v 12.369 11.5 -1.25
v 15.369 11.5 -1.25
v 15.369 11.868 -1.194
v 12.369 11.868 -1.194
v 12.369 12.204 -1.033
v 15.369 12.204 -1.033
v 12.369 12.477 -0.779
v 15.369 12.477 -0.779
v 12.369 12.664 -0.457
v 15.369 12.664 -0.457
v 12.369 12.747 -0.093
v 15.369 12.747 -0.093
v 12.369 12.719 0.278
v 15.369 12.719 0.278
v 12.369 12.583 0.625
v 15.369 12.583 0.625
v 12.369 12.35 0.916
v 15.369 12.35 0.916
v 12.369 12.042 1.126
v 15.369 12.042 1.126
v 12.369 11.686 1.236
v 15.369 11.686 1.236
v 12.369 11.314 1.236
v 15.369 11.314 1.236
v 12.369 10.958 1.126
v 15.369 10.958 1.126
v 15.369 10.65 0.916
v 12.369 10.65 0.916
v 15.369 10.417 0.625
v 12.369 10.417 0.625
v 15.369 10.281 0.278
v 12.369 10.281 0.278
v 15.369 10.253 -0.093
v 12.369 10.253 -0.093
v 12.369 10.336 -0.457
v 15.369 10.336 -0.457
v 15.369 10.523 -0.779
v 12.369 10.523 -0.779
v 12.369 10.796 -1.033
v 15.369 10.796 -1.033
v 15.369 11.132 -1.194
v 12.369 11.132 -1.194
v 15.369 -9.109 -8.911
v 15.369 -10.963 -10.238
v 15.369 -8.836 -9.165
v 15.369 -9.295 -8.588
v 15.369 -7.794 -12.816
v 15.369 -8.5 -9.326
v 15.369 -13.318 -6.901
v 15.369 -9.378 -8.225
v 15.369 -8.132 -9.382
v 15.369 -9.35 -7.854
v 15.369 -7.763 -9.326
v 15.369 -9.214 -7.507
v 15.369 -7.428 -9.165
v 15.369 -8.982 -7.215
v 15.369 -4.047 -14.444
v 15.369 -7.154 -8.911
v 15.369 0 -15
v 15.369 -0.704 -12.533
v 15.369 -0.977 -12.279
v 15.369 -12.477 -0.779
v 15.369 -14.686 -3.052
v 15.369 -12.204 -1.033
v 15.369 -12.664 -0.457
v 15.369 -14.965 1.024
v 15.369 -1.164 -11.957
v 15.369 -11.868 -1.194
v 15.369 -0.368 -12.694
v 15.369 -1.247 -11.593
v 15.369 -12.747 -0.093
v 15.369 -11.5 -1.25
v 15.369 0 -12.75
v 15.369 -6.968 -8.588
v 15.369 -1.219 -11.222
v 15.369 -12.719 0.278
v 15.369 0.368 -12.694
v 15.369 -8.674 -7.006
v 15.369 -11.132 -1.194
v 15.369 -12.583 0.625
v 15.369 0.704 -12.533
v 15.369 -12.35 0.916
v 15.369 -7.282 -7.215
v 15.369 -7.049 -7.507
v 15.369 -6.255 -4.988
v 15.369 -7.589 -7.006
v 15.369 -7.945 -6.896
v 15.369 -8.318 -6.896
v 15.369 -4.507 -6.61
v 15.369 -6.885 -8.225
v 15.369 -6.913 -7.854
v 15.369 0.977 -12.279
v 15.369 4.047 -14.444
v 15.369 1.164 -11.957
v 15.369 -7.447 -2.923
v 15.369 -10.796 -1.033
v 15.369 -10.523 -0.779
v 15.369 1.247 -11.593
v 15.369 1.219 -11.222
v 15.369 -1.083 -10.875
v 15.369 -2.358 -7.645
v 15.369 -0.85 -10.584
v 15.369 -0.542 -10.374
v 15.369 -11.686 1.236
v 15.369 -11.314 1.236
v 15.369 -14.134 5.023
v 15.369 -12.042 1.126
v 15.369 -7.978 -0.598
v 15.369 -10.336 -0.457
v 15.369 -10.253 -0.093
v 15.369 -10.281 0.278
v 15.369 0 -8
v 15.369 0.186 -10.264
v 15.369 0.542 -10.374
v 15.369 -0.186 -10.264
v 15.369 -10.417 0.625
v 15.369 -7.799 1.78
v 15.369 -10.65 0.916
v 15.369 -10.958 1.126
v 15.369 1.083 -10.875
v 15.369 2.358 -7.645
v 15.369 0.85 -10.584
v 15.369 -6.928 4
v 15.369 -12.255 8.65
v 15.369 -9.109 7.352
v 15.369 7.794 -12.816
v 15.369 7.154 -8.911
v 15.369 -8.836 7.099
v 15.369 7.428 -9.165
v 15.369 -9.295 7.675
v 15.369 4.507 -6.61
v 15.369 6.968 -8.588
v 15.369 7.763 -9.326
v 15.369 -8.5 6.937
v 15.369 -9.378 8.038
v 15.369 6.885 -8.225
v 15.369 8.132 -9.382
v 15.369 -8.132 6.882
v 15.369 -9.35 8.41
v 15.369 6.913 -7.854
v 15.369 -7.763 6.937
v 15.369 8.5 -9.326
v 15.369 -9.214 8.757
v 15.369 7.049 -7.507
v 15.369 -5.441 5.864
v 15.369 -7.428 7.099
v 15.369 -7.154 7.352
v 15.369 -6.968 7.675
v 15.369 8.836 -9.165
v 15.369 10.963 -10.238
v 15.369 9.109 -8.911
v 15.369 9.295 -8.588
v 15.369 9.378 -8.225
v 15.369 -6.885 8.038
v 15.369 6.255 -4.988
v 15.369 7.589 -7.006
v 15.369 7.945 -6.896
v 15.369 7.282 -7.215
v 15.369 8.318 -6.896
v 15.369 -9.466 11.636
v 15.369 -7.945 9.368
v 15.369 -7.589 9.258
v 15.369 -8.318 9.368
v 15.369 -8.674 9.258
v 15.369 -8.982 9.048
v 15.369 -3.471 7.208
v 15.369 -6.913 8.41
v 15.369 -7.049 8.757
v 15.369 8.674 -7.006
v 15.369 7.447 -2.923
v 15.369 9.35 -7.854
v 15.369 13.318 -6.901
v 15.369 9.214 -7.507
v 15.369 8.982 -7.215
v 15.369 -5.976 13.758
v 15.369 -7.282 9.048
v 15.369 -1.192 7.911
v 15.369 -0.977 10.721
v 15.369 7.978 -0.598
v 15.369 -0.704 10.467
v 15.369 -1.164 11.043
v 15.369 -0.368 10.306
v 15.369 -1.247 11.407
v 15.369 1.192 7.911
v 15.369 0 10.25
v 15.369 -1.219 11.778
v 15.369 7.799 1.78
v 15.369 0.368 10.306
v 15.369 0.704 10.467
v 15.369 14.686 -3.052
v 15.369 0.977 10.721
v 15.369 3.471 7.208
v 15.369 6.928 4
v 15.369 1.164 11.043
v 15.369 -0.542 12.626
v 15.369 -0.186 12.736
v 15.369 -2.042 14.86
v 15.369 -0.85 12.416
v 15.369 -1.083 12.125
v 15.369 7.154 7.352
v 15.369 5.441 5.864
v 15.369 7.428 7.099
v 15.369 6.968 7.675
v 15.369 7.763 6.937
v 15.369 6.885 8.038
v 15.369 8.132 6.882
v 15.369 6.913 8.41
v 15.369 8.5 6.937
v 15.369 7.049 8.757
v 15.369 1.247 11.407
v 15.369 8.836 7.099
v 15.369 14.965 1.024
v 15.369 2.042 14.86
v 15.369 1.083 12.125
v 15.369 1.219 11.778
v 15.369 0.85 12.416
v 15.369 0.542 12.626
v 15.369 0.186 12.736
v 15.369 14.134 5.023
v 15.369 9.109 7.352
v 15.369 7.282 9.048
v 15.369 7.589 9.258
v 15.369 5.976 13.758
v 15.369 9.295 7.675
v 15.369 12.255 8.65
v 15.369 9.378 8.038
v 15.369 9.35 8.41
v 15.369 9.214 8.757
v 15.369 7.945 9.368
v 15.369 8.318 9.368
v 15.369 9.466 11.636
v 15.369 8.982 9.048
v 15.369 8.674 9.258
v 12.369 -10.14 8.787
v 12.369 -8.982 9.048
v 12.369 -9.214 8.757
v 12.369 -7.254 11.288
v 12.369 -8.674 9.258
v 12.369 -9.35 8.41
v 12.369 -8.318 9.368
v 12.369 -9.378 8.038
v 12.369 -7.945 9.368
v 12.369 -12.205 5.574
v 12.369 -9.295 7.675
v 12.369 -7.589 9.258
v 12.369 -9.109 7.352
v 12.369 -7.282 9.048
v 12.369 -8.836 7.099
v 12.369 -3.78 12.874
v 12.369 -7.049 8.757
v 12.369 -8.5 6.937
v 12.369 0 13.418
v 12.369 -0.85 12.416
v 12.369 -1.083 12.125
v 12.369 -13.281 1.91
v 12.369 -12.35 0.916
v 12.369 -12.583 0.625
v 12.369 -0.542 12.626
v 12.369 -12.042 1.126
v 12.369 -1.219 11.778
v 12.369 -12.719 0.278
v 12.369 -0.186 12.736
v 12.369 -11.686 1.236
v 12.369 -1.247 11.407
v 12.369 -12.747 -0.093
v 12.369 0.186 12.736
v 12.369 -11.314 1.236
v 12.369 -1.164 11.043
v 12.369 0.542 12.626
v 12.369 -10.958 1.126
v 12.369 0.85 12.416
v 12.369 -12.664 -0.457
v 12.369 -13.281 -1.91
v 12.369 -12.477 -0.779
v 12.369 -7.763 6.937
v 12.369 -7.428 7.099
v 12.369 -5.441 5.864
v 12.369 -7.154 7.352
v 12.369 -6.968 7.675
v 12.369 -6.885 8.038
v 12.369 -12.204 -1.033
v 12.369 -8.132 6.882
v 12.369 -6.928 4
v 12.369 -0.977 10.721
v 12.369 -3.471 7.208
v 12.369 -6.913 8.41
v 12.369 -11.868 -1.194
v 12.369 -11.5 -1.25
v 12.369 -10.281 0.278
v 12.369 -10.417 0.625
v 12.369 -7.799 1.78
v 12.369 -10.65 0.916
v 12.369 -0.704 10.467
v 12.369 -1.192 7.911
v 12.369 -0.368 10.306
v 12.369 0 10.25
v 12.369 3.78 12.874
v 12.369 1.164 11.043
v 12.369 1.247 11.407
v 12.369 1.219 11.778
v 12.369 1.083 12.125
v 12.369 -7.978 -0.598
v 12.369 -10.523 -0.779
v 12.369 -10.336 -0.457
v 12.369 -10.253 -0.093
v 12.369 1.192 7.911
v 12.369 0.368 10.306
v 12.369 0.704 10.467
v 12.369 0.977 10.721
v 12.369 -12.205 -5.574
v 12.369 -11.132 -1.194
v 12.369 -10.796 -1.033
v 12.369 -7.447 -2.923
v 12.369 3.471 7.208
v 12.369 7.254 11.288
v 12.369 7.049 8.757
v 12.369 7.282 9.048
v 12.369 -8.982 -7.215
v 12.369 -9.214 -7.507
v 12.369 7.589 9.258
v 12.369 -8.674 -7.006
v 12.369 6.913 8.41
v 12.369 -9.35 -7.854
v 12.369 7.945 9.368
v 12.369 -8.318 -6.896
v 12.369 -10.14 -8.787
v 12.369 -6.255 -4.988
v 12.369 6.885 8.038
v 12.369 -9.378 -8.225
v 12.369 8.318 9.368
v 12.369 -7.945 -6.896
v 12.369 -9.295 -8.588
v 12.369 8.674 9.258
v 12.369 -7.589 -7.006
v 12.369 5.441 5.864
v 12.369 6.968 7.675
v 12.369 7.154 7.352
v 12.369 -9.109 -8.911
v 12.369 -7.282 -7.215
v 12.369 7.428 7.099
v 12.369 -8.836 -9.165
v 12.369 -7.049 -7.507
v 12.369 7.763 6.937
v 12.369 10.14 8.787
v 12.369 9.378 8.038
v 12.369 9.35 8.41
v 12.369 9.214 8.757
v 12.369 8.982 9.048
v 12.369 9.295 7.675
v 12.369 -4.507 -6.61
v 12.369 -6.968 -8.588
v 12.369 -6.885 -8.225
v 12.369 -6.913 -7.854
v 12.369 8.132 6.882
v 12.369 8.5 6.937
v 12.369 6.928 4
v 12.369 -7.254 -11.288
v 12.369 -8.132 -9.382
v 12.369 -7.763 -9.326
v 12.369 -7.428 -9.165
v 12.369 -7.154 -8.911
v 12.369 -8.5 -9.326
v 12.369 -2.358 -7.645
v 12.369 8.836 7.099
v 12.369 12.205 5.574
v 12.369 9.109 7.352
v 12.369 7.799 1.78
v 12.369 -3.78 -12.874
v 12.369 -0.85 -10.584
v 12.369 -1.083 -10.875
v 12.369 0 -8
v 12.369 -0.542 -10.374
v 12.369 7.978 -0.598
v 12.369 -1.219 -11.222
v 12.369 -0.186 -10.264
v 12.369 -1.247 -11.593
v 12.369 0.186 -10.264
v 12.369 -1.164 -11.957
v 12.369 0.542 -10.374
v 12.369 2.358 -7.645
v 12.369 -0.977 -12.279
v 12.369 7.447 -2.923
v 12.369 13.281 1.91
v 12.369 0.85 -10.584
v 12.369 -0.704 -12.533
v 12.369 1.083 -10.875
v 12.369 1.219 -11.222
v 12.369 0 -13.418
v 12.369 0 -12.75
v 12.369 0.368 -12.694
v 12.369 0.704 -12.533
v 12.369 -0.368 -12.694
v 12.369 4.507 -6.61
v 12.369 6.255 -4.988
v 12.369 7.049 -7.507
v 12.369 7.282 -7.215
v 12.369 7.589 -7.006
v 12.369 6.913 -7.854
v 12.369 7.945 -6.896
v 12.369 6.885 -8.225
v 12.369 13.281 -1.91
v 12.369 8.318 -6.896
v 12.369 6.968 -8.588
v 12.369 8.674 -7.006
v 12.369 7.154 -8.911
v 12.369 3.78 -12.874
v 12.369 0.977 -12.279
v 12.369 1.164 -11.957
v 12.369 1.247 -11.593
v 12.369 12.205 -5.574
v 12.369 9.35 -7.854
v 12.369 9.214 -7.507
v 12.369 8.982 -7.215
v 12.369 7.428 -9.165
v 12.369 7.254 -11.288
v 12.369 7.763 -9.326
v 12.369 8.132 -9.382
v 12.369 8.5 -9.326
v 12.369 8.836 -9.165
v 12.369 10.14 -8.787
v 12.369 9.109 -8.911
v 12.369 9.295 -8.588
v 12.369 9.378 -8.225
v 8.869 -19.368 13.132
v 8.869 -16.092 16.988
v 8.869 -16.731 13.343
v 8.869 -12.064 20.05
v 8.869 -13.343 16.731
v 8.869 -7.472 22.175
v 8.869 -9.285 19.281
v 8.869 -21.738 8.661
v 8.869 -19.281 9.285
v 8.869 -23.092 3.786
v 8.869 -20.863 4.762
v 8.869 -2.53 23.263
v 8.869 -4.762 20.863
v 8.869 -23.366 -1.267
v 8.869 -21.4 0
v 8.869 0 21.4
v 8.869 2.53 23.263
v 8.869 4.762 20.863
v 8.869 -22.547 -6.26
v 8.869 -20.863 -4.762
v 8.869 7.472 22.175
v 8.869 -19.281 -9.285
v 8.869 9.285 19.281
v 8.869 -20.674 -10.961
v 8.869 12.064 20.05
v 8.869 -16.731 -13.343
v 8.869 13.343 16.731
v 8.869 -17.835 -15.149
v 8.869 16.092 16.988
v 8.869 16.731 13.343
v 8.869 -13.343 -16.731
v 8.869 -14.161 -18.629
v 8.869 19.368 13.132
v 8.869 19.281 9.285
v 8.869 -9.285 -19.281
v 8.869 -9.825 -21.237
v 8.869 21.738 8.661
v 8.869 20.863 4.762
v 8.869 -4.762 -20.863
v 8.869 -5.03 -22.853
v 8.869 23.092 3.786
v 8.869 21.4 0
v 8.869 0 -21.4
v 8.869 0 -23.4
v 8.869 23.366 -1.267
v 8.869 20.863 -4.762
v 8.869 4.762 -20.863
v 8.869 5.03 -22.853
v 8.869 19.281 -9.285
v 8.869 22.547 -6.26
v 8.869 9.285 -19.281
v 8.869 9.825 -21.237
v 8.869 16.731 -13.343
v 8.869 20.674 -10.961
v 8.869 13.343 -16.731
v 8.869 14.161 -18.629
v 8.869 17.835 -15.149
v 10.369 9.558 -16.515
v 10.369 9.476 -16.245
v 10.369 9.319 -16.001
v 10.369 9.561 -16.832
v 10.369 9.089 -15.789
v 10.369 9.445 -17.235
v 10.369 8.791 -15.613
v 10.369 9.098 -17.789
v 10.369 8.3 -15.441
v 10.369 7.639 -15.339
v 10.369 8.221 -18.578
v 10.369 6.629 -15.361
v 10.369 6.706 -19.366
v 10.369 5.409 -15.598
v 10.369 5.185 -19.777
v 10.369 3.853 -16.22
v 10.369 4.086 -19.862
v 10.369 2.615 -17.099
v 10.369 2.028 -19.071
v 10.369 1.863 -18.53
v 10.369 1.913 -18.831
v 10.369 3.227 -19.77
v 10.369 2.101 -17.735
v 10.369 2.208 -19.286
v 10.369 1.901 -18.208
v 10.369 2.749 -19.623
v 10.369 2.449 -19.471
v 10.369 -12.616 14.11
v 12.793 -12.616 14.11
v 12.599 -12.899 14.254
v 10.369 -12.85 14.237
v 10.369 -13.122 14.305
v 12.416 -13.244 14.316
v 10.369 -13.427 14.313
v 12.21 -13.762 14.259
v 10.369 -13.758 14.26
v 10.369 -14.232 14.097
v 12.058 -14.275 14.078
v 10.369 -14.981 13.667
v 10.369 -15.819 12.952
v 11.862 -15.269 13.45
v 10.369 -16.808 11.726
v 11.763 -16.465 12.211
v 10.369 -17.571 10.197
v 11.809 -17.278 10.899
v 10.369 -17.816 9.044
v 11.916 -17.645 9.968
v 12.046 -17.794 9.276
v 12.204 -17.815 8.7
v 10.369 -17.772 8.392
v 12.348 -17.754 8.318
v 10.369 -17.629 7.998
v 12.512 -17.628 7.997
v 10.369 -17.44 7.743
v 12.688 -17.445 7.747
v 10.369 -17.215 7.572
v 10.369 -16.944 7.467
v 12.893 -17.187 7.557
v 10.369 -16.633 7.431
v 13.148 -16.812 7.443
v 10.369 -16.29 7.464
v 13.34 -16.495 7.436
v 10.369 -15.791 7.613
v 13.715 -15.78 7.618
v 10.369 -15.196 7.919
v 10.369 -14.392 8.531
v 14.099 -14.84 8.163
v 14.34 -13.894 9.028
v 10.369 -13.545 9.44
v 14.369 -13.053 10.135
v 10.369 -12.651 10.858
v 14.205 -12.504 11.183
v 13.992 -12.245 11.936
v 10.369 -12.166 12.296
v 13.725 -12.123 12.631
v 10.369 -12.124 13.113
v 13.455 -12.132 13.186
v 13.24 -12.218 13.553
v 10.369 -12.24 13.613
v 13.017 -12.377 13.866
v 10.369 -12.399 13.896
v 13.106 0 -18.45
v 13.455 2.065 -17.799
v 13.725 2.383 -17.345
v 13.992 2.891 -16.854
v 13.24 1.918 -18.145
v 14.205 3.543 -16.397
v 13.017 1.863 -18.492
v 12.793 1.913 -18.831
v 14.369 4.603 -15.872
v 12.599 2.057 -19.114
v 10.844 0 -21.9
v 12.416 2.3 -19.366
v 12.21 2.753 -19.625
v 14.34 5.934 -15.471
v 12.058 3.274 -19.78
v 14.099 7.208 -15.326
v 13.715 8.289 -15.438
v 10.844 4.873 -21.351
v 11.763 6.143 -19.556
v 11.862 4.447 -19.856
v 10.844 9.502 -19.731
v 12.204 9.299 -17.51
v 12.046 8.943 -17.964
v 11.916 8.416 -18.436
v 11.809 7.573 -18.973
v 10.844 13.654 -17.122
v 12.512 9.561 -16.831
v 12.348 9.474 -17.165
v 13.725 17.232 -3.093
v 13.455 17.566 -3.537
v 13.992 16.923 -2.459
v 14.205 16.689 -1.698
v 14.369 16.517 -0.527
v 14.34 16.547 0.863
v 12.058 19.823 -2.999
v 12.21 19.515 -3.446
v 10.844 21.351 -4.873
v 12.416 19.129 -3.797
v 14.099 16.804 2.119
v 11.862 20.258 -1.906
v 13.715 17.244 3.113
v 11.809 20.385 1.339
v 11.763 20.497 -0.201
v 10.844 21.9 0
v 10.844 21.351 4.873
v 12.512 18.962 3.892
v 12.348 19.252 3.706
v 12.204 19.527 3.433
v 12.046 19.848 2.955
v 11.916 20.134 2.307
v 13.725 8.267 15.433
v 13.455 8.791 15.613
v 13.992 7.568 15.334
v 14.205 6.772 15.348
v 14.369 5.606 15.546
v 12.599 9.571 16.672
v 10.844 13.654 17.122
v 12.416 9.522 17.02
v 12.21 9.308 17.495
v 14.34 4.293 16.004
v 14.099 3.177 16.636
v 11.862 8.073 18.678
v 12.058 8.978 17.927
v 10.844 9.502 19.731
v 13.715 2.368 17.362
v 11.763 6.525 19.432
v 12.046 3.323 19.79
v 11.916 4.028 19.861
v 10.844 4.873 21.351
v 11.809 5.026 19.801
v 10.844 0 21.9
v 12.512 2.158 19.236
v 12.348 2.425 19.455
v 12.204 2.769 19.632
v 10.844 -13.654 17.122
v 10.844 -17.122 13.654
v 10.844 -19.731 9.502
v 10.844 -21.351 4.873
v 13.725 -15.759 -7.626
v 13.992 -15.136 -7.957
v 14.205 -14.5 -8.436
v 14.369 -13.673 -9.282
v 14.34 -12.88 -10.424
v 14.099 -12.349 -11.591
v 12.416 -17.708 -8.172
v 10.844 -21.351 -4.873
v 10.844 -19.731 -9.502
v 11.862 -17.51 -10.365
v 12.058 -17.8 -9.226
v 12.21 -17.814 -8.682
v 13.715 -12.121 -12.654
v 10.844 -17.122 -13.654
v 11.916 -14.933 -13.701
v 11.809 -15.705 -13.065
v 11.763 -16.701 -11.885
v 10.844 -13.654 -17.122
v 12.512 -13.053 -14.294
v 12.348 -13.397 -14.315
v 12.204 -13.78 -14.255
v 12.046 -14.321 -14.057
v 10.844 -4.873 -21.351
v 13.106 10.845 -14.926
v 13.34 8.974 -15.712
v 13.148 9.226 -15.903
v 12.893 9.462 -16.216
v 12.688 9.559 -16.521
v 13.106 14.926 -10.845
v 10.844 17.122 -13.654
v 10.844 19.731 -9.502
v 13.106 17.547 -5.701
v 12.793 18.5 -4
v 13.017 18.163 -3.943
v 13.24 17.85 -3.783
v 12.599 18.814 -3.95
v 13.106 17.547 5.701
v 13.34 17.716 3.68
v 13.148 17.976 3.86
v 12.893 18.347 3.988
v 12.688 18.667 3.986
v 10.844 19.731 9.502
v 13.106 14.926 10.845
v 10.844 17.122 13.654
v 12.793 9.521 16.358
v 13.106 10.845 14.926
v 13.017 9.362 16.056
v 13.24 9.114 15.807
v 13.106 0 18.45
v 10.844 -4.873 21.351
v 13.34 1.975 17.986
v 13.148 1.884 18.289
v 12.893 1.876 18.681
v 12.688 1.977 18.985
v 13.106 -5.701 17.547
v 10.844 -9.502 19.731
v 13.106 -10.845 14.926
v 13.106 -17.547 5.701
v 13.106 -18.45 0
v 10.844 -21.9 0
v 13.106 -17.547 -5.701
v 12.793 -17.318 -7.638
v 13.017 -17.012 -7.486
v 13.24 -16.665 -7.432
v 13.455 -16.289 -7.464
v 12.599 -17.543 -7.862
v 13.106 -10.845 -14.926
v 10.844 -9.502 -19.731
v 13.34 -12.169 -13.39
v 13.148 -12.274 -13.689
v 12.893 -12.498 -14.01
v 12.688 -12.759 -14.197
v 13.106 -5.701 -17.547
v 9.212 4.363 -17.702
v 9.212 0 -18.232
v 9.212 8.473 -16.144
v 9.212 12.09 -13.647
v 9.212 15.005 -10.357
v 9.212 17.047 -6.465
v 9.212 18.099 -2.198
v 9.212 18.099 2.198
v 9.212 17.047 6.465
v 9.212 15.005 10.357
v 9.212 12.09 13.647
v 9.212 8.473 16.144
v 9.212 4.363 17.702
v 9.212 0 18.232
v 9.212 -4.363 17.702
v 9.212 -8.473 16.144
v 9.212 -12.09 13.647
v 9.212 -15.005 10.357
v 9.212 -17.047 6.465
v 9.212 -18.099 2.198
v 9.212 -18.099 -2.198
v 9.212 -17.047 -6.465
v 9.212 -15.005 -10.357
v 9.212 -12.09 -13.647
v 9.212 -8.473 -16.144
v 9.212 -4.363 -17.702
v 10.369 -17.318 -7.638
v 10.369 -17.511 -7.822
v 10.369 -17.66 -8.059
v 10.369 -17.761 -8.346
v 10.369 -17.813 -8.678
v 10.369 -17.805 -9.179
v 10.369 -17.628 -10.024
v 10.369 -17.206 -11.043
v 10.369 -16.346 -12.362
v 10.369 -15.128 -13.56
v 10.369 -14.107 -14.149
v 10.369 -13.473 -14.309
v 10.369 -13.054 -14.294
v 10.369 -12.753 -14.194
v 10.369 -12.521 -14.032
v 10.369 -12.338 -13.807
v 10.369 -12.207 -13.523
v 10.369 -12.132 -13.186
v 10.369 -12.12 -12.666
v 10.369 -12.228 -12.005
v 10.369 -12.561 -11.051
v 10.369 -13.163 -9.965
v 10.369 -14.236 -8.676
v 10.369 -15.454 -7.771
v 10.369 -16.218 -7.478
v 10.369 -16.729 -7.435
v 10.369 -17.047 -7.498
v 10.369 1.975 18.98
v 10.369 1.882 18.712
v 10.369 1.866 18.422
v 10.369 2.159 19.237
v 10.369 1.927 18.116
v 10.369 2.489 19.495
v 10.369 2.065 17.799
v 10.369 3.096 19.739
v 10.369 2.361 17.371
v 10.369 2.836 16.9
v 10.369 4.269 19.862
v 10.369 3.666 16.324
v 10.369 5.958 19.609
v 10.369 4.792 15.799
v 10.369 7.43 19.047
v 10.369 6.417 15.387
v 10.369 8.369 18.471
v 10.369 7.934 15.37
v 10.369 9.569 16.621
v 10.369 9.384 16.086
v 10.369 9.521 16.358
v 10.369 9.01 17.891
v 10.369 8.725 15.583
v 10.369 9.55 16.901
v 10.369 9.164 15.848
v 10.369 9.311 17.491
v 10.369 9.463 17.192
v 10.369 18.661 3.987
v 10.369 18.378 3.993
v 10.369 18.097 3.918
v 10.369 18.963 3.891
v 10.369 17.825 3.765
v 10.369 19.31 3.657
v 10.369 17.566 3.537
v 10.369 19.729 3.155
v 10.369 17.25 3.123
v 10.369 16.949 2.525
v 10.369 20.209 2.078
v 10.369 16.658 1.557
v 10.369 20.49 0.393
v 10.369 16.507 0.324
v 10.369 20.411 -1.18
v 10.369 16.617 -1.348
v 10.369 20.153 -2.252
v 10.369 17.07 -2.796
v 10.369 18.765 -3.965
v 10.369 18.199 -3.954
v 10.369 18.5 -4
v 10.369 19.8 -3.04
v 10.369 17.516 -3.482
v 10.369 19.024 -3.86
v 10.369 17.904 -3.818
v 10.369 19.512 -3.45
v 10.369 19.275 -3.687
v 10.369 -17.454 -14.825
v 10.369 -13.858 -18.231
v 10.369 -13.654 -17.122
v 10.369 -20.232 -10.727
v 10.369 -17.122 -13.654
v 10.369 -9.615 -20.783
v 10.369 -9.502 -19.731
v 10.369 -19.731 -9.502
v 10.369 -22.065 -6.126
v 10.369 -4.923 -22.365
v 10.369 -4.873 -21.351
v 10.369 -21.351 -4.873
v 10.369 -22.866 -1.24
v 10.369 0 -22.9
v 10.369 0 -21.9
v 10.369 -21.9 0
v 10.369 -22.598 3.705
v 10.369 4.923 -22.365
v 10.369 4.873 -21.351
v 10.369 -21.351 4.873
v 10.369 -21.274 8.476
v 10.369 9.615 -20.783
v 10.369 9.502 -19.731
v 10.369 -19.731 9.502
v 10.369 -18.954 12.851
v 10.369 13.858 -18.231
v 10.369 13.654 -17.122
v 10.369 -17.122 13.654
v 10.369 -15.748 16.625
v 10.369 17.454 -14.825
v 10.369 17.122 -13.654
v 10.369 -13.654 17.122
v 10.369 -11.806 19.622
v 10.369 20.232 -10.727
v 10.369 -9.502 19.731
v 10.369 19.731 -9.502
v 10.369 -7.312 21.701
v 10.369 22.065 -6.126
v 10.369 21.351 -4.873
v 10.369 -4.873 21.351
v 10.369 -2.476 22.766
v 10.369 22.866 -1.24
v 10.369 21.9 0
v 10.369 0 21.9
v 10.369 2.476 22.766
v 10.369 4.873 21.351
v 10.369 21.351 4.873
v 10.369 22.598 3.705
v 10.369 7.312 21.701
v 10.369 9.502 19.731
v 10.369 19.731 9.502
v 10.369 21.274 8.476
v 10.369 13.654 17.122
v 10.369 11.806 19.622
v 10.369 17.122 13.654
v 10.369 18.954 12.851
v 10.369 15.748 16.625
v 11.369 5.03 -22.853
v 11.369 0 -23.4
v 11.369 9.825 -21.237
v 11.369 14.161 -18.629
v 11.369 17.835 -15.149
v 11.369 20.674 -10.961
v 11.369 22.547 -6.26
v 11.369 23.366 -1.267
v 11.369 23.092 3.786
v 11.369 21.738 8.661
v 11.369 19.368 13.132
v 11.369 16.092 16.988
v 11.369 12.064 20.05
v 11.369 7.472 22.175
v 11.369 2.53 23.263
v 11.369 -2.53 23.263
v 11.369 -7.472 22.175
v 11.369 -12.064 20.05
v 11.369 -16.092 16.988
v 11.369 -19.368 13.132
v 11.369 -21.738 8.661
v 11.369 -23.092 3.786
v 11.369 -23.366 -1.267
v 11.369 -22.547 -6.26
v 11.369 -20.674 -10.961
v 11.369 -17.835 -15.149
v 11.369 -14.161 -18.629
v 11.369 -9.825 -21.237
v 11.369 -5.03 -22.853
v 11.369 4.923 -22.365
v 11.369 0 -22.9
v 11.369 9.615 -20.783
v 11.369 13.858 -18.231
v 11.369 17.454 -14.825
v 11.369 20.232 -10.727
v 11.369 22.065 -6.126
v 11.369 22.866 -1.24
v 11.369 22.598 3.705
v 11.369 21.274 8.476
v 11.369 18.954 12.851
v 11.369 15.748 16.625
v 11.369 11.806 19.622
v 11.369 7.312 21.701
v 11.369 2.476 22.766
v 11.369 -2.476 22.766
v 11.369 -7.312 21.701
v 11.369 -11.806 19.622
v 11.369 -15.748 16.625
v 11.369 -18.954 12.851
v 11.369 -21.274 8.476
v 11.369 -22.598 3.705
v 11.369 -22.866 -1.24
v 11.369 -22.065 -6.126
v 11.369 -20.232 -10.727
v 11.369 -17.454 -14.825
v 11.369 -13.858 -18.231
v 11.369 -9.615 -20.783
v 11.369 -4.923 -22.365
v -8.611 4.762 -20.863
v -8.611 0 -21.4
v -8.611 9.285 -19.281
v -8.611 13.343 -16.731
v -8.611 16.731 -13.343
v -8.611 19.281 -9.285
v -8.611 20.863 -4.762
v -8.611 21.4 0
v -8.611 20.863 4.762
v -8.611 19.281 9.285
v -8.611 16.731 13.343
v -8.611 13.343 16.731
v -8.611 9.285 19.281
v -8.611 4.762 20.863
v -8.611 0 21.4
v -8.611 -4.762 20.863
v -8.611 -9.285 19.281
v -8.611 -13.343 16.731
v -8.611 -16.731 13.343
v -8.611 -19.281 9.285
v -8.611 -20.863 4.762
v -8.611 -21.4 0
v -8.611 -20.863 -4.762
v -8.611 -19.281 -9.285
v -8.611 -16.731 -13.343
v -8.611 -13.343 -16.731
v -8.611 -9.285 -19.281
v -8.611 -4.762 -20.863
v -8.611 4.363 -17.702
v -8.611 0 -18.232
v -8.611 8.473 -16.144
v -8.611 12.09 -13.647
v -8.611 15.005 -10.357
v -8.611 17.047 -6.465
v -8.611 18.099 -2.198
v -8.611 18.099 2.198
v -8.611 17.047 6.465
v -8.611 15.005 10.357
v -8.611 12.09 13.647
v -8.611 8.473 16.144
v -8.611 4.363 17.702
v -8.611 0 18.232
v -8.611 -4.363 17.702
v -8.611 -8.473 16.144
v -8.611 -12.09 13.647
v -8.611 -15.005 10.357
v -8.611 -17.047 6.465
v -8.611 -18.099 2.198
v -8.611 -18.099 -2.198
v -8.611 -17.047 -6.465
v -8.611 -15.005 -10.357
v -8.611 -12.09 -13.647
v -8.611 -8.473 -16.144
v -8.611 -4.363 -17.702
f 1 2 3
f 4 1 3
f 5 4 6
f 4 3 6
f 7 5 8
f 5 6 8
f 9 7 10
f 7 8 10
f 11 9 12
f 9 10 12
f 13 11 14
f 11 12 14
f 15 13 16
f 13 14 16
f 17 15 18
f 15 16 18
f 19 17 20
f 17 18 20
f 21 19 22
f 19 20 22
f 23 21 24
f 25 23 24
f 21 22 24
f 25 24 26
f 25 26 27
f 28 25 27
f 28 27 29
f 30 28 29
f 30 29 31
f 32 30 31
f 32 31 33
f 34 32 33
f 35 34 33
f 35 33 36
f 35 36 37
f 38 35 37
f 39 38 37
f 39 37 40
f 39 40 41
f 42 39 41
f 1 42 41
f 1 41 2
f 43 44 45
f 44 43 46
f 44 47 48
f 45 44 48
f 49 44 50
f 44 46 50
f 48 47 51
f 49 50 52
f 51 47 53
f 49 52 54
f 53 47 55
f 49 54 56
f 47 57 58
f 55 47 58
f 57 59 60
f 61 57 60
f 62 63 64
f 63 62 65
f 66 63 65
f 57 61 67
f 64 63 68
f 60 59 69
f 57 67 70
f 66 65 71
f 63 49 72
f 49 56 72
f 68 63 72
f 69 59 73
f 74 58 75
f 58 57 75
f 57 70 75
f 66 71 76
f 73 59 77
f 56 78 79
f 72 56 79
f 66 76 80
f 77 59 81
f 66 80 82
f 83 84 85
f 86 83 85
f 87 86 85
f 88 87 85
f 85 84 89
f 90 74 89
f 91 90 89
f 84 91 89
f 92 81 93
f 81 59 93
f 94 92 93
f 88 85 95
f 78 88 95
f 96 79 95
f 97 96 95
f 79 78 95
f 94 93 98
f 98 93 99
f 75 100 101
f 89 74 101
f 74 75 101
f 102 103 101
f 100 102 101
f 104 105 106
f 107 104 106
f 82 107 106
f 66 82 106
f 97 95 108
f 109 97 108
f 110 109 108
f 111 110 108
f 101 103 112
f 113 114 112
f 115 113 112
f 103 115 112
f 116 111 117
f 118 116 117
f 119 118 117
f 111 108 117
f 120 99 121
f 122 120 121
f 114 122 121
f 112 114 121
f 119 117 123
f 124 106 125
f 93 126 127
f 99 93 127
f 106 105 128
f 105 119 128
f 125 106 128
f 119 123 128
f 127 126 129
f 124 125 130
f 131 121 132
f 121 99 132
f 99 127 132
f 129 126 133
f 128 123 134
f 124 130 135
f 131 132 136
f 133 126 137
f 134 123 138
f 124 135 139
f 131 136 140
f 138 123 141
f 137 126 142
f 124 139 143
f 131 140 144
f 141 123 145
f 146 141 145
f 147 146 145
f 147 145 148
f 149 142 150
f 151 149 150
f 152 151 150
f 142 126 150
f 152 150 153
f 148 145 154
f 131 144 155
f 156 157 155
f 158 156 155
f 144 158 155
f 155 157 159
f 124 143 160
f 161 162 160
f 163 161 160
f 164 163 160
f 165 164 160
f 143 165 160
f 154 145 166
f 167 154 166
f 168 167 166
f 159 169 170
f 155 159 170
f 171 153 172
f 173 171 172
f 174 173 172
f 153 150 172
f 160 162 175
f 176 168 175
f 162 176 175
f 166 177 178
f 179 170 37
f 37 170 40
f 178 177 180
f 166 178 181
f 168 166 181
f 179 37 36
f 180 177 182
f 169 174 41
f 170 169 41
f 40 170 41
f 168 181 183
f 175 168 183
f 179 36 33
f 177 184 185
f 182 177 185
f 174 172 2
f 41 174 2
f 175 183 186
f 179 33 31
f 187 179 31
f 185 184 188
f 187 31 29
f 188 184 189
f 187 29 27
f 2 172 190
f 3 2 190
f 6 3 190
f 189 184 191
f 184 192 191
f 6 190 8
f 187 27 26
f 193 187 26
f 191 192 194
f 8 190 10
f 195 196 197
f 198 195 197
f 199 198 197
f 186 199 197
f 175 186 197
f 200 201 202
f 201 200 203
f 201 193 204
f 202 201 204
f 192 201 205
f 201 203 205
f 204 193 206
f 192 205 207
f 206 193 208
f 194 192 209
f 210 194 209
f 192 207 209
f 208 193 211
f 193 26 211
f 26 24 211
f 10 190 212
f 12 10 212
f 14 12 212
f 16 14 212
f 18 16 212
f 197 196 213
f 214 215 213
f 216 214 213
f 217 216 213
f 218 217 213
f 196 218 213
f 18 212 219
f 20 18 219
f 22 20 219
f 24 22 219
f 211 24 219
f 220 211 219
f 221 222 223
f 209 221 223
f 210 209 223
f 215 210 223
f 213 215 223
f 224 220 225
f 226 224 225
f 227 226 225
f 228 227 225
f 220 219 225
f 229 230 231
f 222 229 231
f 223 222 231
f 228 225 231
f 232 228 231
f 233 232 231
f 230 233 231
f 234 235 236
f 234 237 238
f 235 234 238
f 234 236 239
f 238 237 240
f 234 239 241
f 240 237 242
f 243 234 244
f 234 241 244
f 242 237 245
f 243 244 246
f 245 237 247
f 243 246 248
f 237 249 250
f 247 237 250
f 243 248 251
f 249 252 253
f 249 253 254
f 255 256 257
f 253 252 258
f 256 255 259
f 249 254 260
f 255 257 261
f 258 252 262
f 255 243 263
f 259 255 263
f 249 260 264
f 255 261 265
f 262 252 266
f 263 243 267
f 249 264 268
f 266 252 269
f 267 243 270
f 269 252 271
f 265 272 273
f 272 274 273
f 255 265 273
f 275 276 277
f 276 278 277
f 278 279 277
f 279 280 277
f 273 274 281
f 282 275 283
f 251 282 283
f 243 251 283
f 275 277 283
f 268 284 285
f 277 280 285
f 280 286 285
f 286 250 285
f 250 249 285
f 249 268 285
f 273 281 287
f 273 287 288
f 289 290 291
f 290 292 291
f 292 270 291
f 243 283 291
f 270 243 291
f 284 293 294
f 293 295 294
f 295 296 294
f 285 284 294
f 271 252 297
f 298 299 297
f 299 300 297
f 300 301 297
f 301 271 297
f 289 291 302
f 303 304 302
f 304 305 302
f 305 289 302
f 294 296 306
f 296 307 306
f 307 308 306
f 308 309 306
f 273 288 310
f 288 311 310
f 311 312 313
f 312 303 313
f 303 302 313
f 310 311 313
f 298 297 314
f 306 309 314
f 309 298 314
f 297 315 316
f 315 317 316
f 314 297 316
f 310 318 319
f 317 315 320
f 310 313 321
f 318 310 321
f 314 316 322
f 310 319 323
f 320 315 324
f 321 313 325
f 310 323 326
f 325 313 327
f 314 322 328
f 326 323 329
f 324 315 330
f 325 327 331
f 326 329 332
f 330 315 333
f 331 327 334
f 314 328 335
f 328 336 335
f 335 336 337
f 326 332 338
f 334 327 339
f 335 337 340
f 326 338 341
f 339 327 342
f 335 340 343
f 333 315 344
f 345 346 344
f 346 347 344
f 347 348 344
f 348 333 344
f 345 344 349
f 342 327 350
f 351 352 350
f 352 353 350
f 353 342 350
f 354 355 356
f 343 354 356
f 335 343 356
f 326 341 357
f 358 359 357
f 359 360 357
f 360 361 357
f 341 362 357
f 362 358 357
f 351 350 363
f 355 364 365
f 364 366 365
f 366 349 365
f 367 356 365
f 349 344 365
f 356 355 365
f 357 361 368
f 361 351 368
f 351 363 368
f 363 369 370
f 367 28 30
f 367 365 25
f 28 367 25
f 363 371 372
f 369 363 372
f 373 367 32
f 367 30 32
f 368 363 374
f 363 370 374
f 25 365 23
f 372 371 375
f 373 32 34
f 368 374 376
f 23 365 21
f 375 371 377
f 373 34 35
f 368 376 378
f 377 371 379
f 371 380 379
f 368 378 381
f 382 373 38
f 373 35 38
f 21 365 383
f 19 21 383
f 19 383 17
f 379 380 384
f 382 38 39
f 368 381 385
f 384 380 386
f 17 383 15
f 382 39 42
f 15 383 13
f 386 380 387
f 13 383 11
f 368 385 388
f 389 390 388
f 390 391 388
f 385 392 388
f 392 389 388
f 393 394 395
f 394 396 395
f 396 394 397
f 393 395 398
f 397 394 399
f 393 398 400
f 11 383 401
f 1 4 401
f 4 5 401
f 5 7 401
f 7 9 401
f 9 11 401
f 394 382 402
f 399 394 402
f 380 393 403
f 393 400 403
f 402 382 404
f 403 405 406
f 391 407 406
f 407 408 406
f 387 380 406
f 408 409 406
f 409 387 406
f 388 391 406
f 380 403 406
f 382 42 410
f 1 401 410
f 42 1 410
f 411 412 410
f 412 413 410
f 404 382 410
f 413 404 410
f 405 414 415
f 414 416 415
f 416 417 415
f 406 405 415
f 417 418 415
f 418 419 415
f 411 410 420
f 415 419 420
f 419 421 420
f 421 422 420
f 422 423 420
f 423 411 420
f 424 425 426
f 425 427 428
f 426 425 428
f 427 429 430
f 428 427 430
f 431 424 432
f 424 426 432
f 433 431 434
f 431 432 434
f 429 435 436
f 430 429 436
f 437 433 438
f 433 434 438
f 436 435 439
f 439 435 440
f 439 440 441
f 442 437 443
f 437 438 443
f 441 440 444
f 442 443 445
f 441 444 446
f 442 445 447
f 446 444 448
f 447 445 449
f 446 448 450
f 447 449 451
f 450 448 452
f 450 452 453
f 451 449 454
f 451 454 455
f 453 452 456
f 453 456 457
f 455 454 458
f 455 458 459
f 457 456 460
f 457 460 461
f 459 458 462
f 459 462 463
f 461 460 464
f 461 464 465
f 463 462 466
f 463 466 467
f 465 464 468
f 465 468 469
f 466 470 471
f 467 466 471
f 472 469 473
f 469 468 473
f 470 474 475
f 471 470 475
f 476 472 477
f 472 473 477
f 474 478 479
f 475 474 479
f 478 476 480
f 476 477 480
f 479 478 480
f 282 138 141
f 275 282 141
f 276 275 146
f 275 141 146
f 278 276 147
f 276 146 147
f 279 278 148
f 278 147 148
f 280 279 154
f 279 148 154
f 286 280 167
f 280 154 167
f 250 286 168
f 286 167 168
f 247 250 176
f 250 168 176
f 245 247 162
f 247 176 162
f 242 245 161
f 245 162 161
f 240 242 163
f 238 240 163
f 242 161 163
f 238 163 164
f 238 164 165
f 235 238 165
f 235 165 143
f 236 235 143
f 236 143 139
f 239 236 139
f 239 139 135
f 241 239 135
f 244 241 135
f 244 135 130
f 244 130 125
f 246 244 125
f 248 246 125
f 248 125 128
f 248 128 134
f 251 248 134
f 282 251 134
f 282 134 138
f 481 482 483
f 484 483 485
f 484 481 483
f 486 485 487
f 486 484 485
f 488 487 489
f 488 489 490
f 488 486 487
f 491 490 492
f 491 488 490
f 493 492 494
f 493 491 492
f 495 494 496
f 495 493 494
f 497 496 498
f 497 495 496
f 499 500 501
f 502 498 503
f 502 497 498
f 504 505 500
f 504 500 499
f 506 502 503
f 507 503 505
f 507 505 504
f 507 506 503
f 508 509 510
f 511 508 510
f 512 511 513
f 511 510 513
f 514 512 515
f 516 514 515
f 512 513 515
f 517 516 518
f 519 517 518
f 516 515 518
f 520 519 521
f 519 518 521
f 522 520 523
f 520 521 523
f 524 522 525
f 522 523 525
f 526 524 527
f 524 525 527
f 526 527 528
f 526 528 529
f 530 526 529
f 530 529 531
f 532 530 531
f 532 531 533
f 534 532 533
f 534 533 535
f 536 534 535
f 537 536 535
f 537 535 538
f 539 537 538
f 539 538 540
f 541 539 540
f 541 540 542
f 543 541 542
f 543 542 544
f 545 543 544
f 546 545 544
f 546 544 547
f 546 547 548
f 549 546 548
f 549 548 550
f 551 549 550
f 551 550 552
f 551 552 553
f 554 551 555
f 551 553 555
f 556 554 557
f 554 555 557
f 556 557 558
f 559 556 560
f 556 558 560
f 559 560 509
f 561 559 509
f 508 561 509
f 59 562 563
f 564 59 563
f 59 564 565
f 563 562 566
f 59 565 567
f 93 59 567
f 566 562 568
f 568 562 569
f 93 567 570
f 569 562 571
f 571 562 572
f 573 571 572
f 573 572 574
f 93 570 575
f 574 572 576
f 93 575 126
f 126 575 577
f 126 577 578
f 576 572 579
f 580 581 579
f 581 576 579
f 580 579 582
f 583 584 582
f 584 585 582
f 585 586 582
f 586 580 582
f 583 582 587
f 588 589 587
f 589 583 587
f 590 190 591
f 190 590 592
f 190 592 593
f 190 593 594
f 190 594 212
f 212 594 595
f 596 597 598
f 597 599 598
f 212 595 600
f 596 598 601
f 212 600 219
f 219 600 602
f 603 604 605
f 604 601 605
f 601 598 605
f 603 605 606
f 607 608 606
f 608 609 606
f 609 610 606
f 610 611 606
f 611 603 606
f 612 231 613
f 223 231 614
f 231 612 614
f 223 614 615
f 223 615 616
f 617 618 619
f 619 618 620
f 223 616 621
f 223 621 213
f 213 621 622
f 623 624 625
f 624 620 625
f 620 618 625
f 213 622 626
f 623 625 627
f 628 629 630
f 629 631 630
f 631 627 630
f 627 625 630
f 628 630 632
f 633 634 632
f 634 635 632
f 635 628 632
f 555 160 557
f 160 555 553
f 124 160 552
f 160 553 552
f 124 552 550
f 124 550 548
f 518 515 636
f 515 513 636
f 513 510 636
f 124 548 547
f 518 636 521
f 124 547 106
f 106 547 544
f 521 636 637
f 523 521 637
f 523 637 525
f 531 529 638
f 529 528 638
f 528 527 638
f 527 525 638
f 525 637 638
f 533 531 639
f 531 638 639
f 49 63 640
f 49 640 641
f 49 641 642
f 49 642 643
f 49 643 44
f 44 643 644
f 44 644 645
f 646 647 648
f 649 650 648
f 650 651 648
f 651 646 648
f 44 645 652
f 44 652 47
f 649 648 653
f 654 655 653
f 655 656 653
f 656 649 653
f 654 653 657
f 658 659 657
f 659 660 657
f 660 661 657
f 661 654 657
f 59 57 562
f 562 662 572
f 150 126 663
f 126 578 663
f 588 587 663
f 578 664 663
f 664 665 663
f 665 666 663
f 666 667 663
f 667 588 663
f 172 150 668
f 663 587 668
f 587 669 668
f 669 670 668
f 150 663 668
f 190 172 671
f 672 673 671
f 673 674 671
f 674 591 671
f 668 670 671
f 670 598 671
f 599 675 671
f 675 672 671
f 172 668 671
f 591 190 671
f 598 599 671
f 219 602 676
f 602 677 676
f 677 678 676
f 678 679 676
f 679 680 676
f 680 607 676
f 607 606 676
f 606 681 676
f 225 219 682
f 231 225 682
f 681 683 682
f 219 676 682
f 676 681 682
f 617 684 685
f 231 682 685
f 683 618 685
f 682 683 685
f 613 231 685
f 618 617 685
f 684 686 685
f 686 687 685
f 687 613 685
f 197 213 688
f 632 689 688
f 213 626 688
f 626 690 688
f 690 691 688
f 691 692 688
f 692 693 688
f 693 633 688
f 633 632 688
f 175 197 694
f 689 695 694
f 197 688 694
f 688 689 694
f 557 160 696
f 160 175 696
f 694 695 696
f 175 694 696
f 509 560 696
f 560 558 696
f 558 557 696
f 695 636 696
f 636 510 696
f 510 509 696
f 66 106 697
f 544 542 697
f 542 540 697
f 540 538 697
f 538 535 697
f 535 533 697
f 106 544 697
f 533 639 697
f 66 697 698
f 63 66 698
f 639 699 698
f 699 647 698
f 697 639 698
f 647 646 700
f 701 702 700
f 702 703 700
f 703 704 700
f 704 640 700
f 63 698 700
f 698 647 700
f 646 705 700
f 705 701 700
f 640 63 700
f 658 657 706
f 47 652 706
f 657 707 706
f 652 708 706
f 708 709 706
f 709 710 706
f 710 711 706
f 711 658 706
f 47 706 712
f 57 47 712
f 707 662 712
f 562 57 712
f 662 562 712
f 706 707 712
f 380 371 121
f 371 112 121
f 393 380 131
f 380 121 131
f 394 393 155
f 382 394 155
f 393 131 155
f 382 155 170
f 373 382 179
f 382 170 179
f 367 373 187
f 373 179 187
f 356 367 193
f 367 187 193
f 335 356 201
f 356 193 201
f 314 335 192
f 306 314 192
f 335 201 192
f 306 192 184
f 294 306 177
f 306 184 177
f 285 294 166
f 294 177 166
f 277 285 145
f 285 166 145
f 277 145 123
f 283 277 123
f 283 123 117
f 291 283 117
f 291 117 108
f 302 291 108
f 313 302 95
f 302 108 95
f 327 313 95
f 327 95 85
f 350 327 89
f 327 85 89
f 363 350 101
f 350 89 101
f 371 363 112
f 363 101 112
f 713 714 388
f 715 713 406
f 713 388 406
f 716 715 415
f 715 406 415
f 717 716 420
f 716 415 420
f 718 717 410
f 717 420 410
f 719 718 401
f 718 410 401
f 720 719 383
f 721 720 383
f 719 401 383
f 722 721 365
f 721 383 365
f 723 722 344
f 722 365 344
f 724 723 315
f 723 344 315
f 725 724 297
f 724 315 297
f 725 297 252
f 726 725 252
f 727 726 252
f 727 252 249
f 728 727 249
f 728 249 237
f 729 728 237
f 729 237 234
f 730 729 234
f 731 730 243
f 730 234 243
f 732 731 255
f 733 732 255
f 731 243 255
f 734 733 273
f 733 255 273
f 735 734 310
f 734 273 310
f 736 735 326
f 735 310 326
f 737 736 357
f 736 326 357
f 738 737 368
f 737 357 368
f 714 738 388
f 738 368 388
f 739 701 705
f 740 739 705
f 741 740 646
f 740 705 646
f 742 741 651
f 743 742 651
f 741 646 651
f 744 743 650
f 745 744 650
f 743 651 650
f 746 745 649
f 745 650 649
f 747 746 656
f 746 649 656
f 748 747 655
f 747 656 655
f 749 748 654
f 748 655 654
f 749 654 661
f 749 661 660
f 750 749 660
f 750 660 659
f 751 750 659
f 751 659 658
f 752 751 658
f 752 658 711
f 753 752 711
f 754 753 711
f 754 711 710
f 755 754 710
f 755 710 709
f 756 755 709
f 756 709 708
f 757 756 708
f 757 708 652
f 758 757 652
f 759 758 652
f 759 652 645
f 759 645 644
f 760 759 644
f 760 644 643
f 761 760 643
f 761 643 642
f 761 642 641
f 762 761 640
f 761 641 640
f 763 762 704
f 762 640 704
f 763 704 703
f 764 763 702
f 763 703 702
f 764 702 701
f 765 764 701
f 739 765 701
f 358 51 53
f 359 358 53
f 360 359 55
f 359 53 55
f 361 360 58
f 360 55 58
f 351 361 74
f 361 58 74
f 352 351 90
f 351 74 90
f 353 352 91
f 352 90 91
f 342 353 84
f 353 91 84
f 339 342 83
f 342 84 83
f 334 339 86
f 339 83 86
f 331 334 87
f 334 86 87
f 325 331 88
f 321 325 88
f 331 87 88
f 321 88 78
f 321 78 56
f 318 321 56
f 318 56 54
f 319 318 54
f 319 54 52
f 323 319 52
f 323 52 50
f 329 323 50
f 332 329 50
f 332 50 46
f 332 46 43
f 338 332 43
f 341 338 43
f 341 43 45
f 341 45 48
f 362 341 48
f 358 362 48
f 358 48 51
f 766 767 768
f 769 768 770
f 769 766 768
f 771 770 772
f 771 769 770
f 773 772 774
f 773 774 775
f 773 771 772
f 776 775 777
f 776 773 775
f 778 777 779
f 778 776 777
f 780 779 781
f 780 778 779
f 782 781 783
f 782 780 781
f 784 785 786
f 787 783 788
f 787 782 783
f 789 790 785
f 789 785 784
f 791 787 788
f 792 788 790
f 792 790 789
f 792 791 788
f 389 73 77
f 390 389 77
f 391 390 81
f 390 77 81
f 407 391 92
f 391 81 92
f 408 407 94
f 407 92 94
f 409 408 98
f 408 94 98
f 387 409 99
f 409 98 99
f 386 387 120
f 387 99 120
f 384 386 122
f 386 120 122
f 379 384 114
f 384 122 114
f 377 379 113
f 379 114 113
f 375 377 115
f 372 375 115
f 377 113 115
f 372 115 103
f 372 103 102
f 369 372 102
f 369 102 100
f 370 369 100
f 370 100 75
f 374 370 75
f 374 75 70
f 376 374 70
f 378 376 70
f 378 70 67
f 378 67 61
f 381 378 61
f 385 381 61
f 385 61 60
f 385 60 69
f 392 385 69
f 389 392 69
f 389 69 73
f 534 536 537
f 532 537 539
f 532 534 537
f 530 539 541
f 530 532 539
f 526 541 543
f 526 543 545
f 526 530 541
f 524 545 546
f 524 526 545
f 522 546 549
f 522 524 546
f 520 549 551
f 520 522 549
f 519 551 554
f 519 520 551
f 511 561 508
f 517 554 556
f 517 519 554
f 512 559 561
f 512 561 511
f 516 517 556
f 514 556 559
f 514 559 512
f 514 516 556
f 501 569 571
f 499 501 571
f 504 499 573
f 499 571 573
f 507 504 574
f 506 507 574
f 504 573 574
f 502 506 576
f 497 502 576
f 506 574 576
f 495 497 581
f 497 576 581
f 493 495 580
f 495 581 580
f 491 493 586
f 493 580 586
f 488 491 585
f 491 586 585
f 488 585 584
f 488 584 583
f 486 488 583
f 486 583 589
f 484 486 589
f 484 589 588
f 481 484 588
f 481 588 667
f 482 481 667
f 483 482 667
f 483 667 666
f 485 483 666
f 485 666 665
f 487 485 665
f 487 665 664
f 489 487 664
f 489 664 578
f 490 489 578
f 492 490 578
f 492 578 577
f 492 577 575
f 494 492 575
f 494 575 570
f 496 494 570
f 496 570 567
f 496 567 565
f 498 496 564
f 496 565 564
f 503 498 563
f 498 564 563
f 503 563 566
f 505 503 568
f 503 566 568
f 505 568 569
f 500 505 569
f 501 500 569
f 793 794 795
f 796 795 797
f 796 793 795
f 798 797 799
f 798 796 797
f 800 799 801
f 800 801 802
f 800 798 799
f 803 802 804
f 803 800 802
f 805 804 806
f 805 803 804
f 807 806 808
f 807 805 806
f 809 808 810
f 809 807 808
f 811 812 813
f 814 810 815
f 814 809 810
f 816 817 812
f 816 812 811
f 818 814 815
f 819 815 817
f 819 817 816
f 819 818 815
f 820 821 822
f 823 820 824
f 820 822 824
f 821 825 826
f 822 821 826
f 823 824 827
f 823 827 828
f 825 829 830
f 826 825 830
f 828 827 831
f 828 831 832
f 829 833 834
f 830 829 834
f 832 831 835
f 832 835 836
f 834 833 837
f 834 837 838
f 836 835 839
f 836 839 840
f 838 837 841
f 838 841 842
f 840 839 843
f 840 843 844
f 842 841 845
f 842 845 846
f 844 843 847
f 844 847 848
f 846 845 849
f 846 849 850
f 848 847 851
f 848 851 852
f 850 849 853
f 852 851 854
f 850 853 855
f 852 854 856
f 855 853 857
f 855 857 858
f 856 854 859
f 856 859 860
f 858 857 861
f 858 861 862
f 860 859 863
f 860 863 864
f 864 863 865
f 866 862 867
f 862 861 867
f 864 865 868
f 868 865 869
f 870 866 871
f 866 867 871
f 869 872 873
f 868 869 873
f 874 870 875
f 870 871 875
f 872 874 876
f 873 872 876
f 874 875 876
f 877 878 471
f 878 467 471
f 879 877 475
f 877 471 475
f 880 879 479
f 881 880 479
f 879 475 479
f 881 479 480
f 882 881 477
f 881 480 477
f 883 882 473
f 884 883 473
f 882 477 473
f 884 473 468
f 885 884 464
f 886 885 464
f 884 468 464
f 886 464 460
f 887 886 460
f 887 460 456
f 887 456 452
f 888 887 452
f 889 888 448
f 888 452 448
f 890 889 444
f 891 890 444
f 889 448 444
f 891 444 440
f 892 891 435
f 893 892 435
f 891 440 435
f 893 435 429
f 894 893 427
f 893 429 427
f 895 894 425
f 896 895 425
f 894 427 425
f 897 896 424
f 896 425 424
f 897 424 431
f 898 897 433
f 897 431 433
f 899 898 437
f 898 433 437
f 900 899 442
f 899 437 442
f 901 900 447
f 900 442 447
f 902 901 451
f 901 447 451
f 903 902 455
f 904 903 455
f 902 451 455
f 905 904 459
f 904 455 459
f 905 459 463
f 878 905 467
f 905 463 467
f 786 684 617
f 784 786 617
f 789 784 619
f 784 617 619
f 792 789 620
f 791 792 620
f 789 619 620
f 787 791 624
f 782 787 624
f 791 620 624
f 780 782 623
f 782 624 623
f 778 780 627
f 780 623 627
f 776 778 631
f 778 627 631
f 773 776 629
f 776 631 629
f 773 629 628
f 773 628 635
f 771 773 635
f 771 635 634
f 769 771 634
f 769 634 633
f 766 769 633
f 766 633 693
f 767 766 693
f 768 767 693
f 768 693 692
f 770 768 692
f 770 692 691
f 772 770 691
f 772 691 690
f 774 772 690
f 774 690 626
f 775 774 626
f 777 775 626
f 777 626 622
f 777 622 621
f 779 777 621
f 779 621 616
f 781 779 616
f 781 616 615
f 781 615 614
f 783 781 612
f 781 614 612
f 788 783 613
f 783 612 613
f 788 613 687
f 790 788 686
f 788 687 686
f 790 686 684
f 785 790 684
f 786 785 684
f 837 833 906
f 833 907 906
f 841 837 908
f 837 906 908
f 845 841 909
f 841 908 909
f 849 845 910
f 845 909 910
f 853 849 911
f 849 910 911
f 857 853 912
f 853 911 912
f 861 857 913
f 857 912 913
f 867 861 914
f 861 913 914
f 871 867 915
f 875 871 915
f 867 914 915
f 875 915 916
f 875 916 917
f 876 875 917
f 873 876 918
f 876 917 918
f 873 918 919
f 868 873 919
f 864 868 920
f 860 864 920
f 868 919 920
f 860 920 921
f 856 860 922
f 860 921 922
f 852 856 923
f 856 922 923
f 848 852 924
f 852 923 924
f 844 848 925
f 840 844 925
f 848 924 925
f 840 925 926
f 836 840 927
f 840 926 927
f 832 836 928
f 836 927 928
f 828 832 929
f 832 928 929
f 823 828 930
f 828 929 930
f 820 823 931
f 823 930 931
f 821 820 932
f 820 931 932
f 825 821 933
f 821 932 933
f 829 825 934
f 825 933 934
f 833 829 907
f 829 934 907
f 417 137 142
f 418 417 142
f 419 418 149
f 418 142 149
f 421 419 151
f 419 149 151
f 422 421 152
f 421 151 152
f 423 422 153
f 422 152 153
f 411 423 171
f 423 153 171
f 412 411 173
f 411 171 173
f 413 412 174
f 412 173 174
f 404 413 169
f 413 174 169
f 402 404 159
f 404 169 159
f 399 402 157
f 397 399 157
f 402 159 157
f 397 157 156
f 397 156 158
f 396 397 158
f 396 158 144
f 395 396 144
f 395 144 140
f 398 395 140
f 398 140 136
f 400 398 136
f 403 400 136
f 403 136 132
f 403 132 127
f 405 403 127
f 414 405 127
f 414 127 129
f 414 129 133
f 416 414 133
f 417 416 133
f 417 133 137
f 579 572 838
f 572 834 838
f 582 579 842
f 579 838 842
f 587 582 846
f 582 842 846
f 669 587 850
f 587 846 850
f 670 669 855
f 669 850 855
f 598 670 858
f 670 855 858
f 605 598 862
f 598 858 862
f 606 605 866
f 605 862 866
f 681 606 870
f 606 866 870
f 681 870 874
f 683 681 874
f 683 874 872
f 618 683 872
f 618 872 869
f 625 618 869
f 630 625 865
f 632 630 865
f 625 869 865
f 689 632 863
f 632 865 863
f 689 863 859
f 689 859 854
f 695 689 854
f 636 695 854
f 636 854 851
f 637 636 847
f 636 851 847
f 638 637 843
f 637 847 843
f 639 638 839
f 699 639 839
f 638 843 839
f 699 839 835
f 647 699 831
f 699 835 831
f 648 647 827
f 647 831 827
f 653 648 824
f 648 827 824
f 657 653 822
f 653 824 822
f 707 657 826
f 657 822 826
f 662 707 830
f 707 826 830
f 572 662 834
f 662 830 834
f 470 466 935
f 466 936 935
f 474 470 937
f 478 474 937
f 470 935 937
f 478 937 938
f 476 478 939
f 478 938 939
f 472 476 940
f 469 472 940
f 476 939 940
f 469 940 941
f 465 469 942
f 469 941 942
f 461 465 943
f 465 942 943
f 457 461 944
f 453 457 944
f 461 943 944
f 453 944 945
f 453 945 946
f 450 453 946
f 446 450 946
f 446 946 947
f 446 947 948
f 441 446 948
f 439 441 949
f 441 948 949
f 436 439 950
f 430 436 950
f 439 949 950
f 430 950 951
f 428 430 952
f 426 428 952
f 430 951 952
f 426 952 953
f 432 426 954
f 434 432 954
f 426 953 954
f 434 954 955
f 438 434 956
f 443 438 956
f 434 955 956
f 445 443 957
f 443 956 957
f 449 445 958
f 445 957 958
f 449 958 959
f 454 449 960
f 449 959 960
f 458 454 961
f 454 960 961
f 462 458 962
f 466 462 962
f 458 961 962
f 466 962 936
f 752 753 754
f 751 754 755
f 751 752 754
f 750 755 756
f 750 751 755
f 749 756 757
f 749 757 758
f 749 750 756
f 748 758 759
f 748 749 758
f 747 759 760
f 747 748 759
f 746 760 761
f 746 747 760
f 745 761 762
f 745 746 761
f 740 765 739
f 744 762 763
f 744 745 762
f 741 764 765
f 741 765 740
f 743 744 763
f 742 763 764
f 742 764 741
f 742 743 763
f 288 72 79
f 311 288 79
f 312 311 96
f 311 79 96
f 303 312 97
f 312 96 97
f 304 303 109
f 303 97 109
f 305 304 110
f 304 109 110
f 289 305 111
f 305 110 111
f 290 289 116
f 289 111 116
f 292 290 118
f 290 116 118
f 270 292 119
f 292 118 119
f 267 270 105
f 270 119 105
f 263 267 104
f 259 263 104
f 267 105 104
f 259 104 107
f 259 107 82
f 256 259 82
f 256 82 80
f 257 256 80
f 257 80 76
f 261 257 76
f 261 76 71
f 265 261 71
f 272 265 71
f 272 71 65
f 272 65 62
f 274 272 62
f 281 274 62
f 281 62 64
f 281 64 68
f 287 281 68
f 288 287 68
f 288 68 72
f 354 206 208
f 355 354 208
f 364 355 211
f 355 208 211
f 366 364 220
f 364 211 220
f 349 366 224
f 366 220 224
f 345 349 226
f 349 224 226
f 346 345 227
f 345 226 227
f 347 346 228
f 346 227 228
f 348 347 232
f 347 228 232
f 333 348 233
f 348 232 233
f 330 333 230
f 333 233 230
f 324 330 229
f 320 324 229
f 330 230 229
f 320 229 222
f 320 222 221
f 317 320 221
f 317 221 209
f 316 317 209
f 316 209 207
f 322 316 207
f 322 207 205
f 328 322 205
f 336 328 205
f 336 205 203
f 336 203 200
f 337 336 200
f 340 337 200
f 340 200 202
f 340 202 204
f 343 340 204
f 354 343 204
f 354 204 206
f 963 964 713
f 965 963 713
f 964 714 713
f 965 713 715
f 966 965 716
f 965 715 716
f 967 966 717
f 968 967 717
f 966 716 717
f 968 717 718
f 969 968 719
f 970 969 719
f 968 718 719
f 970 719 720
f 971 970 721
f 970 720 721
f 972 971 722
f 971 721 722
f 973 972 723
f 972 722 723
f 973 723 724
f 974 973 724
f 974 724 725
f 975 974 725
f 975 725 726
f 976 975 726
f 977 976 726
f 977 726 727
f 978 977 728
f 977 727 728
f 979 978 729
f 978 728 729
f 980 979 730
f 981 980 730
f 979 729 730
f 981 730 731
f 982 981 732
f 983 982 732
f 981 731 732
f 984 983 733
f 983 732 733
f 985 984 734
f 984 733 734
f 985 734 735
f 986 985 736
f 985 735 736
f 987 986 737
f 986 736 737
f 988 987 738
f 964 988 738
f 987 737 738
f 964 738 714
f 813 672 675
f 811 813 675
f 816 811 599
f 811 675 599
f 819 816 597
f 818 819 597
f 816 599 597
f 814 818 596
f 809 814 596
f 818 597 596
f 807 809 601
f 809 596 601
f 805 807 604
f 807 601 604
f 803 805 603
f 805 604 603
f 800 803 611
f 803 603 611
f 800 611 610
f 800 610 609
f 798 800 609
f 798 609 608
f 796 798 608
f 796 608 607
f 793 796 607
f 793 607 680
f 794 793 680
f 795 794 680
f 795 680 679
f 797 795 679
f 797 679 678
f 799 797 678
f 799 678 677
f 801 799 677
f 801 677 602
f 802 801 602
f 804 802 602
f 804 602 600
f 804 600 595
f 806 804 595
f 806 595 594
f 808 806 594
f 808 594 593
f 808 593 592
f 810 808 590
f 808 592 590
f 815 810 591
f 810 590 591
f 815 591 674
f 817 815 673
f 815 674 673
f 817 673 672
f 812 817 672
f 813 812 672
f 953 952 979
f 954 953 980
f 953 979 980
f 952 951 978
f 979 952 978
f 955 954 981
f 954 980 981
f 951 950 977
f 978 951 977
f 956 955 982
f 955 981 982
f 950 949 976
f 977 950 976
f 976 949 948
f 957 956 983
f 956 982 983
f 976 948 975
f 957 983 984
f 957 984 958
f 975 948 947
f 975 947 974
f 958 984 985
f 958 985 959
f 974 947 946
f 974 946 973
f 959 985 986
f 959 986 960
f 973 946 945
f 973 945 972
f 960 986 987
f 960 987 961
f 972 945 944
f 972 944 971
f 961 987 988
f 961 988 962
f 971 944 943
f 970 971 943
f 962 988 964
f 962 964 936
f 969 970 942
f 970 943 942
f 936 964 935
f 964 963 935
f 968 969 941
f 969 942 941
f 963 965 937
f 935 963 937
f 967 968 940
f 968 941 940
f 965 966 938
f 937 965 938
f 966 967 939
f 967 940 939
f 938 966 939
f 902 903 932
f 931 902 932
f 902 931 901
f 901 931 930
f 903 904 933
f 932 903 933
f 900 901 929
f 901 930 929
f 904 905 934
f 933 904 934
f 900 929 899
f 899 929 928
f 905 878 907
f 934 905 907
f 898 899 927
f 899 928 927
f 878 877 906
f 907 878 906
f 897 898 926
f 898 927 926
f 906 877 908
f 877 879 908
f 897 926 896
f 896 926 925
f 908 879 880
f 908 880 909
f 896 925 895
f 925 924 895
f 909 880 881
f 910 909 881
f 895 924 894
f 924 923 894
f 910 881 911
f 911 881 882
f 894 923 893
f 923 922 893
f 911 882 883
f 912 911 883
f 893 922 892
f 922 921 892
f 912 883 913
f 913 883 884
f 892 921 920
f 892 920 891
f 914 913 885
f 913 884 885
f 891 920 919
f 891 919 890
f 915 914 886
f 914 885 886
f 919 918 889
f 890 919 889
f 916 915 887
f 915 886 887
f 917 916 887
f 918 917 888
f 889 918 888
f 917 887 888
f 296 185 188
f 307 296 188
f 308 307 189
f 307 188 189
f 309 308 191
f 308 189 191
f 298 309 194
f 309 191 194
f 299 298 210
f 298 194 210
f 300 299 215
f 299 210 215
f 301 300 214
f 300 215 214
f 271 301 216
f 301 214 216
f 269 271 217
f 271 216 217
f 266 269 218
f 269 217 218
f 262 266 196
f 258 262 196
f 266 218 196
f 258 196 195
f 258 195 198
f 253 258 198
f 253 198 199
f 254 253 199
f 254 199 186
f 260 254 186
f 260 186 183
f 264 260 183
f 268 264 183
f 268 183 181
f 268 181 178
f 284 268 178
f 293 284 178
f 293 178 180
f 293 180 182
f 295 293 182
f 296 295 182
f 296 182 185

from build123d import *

# Parameters (mm, degrees)
SKETCH4_R          = 1.25
SKETCH4_RX         = 4
SKETCH4_RY         = 2
CUT_EXTRUDE1_DEPTH = 5


with BuildPart() as part:
    # Sketch3 → Revolve1 (revolve)
    with BuildSketch(Plane(origin=(0, 0, 0), x_dir=(1, 0, 0), z_dir=(0, 1, 0))):
        Polygon((10.36932978, 23.4), (8.86932978, 23.4), (8.86932978, 21.4), (-8.61067022, 21.4), (-8.61067022, 18.231946605), (9.211549898, 18.231946605), (12.36932978, 13.417613419), (12.36932978, 8), (15.36932978, 8), (15.36932978, 15), (10.843535586, 21.9), (10.36932978, 21.9), (10.36932978, 22.9), (11.36932978, 22.9), (11.36932978, 23.4), align=None)
    revolve(axis=Axis((-29.774212385, 0, 0), (1, 0, 0)))

    # Sketch4 → Cut-Extrude1 (cut)
    with BuildSketch(Plane(origin=(15.36932978, 0, 0), x_dir=(0, 0, -1), z_dir=(1, 0, 0))):
        with Locations((0, 11.5)):
            Circle(SKETCH4_R)
        with Locations((8.131727984, 8.131727984)):
            Circle(SKETCH4_R)
        with Locations((11.5, 0)):
            Circle(SKETCH4_R)
        with Locations((8.131727984, -8.131727984)):
            Circle(SKETCH4_R)
        with Locations((0, -11.5)):
            Circle(SKETCH4_R)
        with Locations((-8.131727984, -8.131727984)):
            Circle(SKETCH4_R)
        with Locations((-11.5, 0)):
            Circle(SKETCH4_R)
        with Locations((-8.131727984, 8.131727984)):
            Circle(SKETCH4_R)
        with Locations((0, 18.5)):
            Ellipse(SKETCH4_RX, SKETCH4_RY)
        with Locations(Location((17.594545551, 5.716814396), (0, 0, -72))):
            Ellipse(SKETCH4_RX, SKETCH4_RY)
        with Locations(Location((10.874027167, -14.966814396), (0, 0, -144))):
            Ellipse(SKETCH4_RX, SKETCH4_RY)
        with Locations(Location((-10.874027167, -14.966814396), (0, 0, 144))):
            Ellipse(SKETCH4_RX, SKETCH4_RY)
        with Locations(Location((-17.594545551, 5.716814396), (0, 0, 72))):
            Ellipse(SKETCH4_RX, SKETCH4_RY)
    extrude(amount=-CUT_EXTRUDE1_DEPTH, mode=Mode.SUBTRACT)


solid = part.part
